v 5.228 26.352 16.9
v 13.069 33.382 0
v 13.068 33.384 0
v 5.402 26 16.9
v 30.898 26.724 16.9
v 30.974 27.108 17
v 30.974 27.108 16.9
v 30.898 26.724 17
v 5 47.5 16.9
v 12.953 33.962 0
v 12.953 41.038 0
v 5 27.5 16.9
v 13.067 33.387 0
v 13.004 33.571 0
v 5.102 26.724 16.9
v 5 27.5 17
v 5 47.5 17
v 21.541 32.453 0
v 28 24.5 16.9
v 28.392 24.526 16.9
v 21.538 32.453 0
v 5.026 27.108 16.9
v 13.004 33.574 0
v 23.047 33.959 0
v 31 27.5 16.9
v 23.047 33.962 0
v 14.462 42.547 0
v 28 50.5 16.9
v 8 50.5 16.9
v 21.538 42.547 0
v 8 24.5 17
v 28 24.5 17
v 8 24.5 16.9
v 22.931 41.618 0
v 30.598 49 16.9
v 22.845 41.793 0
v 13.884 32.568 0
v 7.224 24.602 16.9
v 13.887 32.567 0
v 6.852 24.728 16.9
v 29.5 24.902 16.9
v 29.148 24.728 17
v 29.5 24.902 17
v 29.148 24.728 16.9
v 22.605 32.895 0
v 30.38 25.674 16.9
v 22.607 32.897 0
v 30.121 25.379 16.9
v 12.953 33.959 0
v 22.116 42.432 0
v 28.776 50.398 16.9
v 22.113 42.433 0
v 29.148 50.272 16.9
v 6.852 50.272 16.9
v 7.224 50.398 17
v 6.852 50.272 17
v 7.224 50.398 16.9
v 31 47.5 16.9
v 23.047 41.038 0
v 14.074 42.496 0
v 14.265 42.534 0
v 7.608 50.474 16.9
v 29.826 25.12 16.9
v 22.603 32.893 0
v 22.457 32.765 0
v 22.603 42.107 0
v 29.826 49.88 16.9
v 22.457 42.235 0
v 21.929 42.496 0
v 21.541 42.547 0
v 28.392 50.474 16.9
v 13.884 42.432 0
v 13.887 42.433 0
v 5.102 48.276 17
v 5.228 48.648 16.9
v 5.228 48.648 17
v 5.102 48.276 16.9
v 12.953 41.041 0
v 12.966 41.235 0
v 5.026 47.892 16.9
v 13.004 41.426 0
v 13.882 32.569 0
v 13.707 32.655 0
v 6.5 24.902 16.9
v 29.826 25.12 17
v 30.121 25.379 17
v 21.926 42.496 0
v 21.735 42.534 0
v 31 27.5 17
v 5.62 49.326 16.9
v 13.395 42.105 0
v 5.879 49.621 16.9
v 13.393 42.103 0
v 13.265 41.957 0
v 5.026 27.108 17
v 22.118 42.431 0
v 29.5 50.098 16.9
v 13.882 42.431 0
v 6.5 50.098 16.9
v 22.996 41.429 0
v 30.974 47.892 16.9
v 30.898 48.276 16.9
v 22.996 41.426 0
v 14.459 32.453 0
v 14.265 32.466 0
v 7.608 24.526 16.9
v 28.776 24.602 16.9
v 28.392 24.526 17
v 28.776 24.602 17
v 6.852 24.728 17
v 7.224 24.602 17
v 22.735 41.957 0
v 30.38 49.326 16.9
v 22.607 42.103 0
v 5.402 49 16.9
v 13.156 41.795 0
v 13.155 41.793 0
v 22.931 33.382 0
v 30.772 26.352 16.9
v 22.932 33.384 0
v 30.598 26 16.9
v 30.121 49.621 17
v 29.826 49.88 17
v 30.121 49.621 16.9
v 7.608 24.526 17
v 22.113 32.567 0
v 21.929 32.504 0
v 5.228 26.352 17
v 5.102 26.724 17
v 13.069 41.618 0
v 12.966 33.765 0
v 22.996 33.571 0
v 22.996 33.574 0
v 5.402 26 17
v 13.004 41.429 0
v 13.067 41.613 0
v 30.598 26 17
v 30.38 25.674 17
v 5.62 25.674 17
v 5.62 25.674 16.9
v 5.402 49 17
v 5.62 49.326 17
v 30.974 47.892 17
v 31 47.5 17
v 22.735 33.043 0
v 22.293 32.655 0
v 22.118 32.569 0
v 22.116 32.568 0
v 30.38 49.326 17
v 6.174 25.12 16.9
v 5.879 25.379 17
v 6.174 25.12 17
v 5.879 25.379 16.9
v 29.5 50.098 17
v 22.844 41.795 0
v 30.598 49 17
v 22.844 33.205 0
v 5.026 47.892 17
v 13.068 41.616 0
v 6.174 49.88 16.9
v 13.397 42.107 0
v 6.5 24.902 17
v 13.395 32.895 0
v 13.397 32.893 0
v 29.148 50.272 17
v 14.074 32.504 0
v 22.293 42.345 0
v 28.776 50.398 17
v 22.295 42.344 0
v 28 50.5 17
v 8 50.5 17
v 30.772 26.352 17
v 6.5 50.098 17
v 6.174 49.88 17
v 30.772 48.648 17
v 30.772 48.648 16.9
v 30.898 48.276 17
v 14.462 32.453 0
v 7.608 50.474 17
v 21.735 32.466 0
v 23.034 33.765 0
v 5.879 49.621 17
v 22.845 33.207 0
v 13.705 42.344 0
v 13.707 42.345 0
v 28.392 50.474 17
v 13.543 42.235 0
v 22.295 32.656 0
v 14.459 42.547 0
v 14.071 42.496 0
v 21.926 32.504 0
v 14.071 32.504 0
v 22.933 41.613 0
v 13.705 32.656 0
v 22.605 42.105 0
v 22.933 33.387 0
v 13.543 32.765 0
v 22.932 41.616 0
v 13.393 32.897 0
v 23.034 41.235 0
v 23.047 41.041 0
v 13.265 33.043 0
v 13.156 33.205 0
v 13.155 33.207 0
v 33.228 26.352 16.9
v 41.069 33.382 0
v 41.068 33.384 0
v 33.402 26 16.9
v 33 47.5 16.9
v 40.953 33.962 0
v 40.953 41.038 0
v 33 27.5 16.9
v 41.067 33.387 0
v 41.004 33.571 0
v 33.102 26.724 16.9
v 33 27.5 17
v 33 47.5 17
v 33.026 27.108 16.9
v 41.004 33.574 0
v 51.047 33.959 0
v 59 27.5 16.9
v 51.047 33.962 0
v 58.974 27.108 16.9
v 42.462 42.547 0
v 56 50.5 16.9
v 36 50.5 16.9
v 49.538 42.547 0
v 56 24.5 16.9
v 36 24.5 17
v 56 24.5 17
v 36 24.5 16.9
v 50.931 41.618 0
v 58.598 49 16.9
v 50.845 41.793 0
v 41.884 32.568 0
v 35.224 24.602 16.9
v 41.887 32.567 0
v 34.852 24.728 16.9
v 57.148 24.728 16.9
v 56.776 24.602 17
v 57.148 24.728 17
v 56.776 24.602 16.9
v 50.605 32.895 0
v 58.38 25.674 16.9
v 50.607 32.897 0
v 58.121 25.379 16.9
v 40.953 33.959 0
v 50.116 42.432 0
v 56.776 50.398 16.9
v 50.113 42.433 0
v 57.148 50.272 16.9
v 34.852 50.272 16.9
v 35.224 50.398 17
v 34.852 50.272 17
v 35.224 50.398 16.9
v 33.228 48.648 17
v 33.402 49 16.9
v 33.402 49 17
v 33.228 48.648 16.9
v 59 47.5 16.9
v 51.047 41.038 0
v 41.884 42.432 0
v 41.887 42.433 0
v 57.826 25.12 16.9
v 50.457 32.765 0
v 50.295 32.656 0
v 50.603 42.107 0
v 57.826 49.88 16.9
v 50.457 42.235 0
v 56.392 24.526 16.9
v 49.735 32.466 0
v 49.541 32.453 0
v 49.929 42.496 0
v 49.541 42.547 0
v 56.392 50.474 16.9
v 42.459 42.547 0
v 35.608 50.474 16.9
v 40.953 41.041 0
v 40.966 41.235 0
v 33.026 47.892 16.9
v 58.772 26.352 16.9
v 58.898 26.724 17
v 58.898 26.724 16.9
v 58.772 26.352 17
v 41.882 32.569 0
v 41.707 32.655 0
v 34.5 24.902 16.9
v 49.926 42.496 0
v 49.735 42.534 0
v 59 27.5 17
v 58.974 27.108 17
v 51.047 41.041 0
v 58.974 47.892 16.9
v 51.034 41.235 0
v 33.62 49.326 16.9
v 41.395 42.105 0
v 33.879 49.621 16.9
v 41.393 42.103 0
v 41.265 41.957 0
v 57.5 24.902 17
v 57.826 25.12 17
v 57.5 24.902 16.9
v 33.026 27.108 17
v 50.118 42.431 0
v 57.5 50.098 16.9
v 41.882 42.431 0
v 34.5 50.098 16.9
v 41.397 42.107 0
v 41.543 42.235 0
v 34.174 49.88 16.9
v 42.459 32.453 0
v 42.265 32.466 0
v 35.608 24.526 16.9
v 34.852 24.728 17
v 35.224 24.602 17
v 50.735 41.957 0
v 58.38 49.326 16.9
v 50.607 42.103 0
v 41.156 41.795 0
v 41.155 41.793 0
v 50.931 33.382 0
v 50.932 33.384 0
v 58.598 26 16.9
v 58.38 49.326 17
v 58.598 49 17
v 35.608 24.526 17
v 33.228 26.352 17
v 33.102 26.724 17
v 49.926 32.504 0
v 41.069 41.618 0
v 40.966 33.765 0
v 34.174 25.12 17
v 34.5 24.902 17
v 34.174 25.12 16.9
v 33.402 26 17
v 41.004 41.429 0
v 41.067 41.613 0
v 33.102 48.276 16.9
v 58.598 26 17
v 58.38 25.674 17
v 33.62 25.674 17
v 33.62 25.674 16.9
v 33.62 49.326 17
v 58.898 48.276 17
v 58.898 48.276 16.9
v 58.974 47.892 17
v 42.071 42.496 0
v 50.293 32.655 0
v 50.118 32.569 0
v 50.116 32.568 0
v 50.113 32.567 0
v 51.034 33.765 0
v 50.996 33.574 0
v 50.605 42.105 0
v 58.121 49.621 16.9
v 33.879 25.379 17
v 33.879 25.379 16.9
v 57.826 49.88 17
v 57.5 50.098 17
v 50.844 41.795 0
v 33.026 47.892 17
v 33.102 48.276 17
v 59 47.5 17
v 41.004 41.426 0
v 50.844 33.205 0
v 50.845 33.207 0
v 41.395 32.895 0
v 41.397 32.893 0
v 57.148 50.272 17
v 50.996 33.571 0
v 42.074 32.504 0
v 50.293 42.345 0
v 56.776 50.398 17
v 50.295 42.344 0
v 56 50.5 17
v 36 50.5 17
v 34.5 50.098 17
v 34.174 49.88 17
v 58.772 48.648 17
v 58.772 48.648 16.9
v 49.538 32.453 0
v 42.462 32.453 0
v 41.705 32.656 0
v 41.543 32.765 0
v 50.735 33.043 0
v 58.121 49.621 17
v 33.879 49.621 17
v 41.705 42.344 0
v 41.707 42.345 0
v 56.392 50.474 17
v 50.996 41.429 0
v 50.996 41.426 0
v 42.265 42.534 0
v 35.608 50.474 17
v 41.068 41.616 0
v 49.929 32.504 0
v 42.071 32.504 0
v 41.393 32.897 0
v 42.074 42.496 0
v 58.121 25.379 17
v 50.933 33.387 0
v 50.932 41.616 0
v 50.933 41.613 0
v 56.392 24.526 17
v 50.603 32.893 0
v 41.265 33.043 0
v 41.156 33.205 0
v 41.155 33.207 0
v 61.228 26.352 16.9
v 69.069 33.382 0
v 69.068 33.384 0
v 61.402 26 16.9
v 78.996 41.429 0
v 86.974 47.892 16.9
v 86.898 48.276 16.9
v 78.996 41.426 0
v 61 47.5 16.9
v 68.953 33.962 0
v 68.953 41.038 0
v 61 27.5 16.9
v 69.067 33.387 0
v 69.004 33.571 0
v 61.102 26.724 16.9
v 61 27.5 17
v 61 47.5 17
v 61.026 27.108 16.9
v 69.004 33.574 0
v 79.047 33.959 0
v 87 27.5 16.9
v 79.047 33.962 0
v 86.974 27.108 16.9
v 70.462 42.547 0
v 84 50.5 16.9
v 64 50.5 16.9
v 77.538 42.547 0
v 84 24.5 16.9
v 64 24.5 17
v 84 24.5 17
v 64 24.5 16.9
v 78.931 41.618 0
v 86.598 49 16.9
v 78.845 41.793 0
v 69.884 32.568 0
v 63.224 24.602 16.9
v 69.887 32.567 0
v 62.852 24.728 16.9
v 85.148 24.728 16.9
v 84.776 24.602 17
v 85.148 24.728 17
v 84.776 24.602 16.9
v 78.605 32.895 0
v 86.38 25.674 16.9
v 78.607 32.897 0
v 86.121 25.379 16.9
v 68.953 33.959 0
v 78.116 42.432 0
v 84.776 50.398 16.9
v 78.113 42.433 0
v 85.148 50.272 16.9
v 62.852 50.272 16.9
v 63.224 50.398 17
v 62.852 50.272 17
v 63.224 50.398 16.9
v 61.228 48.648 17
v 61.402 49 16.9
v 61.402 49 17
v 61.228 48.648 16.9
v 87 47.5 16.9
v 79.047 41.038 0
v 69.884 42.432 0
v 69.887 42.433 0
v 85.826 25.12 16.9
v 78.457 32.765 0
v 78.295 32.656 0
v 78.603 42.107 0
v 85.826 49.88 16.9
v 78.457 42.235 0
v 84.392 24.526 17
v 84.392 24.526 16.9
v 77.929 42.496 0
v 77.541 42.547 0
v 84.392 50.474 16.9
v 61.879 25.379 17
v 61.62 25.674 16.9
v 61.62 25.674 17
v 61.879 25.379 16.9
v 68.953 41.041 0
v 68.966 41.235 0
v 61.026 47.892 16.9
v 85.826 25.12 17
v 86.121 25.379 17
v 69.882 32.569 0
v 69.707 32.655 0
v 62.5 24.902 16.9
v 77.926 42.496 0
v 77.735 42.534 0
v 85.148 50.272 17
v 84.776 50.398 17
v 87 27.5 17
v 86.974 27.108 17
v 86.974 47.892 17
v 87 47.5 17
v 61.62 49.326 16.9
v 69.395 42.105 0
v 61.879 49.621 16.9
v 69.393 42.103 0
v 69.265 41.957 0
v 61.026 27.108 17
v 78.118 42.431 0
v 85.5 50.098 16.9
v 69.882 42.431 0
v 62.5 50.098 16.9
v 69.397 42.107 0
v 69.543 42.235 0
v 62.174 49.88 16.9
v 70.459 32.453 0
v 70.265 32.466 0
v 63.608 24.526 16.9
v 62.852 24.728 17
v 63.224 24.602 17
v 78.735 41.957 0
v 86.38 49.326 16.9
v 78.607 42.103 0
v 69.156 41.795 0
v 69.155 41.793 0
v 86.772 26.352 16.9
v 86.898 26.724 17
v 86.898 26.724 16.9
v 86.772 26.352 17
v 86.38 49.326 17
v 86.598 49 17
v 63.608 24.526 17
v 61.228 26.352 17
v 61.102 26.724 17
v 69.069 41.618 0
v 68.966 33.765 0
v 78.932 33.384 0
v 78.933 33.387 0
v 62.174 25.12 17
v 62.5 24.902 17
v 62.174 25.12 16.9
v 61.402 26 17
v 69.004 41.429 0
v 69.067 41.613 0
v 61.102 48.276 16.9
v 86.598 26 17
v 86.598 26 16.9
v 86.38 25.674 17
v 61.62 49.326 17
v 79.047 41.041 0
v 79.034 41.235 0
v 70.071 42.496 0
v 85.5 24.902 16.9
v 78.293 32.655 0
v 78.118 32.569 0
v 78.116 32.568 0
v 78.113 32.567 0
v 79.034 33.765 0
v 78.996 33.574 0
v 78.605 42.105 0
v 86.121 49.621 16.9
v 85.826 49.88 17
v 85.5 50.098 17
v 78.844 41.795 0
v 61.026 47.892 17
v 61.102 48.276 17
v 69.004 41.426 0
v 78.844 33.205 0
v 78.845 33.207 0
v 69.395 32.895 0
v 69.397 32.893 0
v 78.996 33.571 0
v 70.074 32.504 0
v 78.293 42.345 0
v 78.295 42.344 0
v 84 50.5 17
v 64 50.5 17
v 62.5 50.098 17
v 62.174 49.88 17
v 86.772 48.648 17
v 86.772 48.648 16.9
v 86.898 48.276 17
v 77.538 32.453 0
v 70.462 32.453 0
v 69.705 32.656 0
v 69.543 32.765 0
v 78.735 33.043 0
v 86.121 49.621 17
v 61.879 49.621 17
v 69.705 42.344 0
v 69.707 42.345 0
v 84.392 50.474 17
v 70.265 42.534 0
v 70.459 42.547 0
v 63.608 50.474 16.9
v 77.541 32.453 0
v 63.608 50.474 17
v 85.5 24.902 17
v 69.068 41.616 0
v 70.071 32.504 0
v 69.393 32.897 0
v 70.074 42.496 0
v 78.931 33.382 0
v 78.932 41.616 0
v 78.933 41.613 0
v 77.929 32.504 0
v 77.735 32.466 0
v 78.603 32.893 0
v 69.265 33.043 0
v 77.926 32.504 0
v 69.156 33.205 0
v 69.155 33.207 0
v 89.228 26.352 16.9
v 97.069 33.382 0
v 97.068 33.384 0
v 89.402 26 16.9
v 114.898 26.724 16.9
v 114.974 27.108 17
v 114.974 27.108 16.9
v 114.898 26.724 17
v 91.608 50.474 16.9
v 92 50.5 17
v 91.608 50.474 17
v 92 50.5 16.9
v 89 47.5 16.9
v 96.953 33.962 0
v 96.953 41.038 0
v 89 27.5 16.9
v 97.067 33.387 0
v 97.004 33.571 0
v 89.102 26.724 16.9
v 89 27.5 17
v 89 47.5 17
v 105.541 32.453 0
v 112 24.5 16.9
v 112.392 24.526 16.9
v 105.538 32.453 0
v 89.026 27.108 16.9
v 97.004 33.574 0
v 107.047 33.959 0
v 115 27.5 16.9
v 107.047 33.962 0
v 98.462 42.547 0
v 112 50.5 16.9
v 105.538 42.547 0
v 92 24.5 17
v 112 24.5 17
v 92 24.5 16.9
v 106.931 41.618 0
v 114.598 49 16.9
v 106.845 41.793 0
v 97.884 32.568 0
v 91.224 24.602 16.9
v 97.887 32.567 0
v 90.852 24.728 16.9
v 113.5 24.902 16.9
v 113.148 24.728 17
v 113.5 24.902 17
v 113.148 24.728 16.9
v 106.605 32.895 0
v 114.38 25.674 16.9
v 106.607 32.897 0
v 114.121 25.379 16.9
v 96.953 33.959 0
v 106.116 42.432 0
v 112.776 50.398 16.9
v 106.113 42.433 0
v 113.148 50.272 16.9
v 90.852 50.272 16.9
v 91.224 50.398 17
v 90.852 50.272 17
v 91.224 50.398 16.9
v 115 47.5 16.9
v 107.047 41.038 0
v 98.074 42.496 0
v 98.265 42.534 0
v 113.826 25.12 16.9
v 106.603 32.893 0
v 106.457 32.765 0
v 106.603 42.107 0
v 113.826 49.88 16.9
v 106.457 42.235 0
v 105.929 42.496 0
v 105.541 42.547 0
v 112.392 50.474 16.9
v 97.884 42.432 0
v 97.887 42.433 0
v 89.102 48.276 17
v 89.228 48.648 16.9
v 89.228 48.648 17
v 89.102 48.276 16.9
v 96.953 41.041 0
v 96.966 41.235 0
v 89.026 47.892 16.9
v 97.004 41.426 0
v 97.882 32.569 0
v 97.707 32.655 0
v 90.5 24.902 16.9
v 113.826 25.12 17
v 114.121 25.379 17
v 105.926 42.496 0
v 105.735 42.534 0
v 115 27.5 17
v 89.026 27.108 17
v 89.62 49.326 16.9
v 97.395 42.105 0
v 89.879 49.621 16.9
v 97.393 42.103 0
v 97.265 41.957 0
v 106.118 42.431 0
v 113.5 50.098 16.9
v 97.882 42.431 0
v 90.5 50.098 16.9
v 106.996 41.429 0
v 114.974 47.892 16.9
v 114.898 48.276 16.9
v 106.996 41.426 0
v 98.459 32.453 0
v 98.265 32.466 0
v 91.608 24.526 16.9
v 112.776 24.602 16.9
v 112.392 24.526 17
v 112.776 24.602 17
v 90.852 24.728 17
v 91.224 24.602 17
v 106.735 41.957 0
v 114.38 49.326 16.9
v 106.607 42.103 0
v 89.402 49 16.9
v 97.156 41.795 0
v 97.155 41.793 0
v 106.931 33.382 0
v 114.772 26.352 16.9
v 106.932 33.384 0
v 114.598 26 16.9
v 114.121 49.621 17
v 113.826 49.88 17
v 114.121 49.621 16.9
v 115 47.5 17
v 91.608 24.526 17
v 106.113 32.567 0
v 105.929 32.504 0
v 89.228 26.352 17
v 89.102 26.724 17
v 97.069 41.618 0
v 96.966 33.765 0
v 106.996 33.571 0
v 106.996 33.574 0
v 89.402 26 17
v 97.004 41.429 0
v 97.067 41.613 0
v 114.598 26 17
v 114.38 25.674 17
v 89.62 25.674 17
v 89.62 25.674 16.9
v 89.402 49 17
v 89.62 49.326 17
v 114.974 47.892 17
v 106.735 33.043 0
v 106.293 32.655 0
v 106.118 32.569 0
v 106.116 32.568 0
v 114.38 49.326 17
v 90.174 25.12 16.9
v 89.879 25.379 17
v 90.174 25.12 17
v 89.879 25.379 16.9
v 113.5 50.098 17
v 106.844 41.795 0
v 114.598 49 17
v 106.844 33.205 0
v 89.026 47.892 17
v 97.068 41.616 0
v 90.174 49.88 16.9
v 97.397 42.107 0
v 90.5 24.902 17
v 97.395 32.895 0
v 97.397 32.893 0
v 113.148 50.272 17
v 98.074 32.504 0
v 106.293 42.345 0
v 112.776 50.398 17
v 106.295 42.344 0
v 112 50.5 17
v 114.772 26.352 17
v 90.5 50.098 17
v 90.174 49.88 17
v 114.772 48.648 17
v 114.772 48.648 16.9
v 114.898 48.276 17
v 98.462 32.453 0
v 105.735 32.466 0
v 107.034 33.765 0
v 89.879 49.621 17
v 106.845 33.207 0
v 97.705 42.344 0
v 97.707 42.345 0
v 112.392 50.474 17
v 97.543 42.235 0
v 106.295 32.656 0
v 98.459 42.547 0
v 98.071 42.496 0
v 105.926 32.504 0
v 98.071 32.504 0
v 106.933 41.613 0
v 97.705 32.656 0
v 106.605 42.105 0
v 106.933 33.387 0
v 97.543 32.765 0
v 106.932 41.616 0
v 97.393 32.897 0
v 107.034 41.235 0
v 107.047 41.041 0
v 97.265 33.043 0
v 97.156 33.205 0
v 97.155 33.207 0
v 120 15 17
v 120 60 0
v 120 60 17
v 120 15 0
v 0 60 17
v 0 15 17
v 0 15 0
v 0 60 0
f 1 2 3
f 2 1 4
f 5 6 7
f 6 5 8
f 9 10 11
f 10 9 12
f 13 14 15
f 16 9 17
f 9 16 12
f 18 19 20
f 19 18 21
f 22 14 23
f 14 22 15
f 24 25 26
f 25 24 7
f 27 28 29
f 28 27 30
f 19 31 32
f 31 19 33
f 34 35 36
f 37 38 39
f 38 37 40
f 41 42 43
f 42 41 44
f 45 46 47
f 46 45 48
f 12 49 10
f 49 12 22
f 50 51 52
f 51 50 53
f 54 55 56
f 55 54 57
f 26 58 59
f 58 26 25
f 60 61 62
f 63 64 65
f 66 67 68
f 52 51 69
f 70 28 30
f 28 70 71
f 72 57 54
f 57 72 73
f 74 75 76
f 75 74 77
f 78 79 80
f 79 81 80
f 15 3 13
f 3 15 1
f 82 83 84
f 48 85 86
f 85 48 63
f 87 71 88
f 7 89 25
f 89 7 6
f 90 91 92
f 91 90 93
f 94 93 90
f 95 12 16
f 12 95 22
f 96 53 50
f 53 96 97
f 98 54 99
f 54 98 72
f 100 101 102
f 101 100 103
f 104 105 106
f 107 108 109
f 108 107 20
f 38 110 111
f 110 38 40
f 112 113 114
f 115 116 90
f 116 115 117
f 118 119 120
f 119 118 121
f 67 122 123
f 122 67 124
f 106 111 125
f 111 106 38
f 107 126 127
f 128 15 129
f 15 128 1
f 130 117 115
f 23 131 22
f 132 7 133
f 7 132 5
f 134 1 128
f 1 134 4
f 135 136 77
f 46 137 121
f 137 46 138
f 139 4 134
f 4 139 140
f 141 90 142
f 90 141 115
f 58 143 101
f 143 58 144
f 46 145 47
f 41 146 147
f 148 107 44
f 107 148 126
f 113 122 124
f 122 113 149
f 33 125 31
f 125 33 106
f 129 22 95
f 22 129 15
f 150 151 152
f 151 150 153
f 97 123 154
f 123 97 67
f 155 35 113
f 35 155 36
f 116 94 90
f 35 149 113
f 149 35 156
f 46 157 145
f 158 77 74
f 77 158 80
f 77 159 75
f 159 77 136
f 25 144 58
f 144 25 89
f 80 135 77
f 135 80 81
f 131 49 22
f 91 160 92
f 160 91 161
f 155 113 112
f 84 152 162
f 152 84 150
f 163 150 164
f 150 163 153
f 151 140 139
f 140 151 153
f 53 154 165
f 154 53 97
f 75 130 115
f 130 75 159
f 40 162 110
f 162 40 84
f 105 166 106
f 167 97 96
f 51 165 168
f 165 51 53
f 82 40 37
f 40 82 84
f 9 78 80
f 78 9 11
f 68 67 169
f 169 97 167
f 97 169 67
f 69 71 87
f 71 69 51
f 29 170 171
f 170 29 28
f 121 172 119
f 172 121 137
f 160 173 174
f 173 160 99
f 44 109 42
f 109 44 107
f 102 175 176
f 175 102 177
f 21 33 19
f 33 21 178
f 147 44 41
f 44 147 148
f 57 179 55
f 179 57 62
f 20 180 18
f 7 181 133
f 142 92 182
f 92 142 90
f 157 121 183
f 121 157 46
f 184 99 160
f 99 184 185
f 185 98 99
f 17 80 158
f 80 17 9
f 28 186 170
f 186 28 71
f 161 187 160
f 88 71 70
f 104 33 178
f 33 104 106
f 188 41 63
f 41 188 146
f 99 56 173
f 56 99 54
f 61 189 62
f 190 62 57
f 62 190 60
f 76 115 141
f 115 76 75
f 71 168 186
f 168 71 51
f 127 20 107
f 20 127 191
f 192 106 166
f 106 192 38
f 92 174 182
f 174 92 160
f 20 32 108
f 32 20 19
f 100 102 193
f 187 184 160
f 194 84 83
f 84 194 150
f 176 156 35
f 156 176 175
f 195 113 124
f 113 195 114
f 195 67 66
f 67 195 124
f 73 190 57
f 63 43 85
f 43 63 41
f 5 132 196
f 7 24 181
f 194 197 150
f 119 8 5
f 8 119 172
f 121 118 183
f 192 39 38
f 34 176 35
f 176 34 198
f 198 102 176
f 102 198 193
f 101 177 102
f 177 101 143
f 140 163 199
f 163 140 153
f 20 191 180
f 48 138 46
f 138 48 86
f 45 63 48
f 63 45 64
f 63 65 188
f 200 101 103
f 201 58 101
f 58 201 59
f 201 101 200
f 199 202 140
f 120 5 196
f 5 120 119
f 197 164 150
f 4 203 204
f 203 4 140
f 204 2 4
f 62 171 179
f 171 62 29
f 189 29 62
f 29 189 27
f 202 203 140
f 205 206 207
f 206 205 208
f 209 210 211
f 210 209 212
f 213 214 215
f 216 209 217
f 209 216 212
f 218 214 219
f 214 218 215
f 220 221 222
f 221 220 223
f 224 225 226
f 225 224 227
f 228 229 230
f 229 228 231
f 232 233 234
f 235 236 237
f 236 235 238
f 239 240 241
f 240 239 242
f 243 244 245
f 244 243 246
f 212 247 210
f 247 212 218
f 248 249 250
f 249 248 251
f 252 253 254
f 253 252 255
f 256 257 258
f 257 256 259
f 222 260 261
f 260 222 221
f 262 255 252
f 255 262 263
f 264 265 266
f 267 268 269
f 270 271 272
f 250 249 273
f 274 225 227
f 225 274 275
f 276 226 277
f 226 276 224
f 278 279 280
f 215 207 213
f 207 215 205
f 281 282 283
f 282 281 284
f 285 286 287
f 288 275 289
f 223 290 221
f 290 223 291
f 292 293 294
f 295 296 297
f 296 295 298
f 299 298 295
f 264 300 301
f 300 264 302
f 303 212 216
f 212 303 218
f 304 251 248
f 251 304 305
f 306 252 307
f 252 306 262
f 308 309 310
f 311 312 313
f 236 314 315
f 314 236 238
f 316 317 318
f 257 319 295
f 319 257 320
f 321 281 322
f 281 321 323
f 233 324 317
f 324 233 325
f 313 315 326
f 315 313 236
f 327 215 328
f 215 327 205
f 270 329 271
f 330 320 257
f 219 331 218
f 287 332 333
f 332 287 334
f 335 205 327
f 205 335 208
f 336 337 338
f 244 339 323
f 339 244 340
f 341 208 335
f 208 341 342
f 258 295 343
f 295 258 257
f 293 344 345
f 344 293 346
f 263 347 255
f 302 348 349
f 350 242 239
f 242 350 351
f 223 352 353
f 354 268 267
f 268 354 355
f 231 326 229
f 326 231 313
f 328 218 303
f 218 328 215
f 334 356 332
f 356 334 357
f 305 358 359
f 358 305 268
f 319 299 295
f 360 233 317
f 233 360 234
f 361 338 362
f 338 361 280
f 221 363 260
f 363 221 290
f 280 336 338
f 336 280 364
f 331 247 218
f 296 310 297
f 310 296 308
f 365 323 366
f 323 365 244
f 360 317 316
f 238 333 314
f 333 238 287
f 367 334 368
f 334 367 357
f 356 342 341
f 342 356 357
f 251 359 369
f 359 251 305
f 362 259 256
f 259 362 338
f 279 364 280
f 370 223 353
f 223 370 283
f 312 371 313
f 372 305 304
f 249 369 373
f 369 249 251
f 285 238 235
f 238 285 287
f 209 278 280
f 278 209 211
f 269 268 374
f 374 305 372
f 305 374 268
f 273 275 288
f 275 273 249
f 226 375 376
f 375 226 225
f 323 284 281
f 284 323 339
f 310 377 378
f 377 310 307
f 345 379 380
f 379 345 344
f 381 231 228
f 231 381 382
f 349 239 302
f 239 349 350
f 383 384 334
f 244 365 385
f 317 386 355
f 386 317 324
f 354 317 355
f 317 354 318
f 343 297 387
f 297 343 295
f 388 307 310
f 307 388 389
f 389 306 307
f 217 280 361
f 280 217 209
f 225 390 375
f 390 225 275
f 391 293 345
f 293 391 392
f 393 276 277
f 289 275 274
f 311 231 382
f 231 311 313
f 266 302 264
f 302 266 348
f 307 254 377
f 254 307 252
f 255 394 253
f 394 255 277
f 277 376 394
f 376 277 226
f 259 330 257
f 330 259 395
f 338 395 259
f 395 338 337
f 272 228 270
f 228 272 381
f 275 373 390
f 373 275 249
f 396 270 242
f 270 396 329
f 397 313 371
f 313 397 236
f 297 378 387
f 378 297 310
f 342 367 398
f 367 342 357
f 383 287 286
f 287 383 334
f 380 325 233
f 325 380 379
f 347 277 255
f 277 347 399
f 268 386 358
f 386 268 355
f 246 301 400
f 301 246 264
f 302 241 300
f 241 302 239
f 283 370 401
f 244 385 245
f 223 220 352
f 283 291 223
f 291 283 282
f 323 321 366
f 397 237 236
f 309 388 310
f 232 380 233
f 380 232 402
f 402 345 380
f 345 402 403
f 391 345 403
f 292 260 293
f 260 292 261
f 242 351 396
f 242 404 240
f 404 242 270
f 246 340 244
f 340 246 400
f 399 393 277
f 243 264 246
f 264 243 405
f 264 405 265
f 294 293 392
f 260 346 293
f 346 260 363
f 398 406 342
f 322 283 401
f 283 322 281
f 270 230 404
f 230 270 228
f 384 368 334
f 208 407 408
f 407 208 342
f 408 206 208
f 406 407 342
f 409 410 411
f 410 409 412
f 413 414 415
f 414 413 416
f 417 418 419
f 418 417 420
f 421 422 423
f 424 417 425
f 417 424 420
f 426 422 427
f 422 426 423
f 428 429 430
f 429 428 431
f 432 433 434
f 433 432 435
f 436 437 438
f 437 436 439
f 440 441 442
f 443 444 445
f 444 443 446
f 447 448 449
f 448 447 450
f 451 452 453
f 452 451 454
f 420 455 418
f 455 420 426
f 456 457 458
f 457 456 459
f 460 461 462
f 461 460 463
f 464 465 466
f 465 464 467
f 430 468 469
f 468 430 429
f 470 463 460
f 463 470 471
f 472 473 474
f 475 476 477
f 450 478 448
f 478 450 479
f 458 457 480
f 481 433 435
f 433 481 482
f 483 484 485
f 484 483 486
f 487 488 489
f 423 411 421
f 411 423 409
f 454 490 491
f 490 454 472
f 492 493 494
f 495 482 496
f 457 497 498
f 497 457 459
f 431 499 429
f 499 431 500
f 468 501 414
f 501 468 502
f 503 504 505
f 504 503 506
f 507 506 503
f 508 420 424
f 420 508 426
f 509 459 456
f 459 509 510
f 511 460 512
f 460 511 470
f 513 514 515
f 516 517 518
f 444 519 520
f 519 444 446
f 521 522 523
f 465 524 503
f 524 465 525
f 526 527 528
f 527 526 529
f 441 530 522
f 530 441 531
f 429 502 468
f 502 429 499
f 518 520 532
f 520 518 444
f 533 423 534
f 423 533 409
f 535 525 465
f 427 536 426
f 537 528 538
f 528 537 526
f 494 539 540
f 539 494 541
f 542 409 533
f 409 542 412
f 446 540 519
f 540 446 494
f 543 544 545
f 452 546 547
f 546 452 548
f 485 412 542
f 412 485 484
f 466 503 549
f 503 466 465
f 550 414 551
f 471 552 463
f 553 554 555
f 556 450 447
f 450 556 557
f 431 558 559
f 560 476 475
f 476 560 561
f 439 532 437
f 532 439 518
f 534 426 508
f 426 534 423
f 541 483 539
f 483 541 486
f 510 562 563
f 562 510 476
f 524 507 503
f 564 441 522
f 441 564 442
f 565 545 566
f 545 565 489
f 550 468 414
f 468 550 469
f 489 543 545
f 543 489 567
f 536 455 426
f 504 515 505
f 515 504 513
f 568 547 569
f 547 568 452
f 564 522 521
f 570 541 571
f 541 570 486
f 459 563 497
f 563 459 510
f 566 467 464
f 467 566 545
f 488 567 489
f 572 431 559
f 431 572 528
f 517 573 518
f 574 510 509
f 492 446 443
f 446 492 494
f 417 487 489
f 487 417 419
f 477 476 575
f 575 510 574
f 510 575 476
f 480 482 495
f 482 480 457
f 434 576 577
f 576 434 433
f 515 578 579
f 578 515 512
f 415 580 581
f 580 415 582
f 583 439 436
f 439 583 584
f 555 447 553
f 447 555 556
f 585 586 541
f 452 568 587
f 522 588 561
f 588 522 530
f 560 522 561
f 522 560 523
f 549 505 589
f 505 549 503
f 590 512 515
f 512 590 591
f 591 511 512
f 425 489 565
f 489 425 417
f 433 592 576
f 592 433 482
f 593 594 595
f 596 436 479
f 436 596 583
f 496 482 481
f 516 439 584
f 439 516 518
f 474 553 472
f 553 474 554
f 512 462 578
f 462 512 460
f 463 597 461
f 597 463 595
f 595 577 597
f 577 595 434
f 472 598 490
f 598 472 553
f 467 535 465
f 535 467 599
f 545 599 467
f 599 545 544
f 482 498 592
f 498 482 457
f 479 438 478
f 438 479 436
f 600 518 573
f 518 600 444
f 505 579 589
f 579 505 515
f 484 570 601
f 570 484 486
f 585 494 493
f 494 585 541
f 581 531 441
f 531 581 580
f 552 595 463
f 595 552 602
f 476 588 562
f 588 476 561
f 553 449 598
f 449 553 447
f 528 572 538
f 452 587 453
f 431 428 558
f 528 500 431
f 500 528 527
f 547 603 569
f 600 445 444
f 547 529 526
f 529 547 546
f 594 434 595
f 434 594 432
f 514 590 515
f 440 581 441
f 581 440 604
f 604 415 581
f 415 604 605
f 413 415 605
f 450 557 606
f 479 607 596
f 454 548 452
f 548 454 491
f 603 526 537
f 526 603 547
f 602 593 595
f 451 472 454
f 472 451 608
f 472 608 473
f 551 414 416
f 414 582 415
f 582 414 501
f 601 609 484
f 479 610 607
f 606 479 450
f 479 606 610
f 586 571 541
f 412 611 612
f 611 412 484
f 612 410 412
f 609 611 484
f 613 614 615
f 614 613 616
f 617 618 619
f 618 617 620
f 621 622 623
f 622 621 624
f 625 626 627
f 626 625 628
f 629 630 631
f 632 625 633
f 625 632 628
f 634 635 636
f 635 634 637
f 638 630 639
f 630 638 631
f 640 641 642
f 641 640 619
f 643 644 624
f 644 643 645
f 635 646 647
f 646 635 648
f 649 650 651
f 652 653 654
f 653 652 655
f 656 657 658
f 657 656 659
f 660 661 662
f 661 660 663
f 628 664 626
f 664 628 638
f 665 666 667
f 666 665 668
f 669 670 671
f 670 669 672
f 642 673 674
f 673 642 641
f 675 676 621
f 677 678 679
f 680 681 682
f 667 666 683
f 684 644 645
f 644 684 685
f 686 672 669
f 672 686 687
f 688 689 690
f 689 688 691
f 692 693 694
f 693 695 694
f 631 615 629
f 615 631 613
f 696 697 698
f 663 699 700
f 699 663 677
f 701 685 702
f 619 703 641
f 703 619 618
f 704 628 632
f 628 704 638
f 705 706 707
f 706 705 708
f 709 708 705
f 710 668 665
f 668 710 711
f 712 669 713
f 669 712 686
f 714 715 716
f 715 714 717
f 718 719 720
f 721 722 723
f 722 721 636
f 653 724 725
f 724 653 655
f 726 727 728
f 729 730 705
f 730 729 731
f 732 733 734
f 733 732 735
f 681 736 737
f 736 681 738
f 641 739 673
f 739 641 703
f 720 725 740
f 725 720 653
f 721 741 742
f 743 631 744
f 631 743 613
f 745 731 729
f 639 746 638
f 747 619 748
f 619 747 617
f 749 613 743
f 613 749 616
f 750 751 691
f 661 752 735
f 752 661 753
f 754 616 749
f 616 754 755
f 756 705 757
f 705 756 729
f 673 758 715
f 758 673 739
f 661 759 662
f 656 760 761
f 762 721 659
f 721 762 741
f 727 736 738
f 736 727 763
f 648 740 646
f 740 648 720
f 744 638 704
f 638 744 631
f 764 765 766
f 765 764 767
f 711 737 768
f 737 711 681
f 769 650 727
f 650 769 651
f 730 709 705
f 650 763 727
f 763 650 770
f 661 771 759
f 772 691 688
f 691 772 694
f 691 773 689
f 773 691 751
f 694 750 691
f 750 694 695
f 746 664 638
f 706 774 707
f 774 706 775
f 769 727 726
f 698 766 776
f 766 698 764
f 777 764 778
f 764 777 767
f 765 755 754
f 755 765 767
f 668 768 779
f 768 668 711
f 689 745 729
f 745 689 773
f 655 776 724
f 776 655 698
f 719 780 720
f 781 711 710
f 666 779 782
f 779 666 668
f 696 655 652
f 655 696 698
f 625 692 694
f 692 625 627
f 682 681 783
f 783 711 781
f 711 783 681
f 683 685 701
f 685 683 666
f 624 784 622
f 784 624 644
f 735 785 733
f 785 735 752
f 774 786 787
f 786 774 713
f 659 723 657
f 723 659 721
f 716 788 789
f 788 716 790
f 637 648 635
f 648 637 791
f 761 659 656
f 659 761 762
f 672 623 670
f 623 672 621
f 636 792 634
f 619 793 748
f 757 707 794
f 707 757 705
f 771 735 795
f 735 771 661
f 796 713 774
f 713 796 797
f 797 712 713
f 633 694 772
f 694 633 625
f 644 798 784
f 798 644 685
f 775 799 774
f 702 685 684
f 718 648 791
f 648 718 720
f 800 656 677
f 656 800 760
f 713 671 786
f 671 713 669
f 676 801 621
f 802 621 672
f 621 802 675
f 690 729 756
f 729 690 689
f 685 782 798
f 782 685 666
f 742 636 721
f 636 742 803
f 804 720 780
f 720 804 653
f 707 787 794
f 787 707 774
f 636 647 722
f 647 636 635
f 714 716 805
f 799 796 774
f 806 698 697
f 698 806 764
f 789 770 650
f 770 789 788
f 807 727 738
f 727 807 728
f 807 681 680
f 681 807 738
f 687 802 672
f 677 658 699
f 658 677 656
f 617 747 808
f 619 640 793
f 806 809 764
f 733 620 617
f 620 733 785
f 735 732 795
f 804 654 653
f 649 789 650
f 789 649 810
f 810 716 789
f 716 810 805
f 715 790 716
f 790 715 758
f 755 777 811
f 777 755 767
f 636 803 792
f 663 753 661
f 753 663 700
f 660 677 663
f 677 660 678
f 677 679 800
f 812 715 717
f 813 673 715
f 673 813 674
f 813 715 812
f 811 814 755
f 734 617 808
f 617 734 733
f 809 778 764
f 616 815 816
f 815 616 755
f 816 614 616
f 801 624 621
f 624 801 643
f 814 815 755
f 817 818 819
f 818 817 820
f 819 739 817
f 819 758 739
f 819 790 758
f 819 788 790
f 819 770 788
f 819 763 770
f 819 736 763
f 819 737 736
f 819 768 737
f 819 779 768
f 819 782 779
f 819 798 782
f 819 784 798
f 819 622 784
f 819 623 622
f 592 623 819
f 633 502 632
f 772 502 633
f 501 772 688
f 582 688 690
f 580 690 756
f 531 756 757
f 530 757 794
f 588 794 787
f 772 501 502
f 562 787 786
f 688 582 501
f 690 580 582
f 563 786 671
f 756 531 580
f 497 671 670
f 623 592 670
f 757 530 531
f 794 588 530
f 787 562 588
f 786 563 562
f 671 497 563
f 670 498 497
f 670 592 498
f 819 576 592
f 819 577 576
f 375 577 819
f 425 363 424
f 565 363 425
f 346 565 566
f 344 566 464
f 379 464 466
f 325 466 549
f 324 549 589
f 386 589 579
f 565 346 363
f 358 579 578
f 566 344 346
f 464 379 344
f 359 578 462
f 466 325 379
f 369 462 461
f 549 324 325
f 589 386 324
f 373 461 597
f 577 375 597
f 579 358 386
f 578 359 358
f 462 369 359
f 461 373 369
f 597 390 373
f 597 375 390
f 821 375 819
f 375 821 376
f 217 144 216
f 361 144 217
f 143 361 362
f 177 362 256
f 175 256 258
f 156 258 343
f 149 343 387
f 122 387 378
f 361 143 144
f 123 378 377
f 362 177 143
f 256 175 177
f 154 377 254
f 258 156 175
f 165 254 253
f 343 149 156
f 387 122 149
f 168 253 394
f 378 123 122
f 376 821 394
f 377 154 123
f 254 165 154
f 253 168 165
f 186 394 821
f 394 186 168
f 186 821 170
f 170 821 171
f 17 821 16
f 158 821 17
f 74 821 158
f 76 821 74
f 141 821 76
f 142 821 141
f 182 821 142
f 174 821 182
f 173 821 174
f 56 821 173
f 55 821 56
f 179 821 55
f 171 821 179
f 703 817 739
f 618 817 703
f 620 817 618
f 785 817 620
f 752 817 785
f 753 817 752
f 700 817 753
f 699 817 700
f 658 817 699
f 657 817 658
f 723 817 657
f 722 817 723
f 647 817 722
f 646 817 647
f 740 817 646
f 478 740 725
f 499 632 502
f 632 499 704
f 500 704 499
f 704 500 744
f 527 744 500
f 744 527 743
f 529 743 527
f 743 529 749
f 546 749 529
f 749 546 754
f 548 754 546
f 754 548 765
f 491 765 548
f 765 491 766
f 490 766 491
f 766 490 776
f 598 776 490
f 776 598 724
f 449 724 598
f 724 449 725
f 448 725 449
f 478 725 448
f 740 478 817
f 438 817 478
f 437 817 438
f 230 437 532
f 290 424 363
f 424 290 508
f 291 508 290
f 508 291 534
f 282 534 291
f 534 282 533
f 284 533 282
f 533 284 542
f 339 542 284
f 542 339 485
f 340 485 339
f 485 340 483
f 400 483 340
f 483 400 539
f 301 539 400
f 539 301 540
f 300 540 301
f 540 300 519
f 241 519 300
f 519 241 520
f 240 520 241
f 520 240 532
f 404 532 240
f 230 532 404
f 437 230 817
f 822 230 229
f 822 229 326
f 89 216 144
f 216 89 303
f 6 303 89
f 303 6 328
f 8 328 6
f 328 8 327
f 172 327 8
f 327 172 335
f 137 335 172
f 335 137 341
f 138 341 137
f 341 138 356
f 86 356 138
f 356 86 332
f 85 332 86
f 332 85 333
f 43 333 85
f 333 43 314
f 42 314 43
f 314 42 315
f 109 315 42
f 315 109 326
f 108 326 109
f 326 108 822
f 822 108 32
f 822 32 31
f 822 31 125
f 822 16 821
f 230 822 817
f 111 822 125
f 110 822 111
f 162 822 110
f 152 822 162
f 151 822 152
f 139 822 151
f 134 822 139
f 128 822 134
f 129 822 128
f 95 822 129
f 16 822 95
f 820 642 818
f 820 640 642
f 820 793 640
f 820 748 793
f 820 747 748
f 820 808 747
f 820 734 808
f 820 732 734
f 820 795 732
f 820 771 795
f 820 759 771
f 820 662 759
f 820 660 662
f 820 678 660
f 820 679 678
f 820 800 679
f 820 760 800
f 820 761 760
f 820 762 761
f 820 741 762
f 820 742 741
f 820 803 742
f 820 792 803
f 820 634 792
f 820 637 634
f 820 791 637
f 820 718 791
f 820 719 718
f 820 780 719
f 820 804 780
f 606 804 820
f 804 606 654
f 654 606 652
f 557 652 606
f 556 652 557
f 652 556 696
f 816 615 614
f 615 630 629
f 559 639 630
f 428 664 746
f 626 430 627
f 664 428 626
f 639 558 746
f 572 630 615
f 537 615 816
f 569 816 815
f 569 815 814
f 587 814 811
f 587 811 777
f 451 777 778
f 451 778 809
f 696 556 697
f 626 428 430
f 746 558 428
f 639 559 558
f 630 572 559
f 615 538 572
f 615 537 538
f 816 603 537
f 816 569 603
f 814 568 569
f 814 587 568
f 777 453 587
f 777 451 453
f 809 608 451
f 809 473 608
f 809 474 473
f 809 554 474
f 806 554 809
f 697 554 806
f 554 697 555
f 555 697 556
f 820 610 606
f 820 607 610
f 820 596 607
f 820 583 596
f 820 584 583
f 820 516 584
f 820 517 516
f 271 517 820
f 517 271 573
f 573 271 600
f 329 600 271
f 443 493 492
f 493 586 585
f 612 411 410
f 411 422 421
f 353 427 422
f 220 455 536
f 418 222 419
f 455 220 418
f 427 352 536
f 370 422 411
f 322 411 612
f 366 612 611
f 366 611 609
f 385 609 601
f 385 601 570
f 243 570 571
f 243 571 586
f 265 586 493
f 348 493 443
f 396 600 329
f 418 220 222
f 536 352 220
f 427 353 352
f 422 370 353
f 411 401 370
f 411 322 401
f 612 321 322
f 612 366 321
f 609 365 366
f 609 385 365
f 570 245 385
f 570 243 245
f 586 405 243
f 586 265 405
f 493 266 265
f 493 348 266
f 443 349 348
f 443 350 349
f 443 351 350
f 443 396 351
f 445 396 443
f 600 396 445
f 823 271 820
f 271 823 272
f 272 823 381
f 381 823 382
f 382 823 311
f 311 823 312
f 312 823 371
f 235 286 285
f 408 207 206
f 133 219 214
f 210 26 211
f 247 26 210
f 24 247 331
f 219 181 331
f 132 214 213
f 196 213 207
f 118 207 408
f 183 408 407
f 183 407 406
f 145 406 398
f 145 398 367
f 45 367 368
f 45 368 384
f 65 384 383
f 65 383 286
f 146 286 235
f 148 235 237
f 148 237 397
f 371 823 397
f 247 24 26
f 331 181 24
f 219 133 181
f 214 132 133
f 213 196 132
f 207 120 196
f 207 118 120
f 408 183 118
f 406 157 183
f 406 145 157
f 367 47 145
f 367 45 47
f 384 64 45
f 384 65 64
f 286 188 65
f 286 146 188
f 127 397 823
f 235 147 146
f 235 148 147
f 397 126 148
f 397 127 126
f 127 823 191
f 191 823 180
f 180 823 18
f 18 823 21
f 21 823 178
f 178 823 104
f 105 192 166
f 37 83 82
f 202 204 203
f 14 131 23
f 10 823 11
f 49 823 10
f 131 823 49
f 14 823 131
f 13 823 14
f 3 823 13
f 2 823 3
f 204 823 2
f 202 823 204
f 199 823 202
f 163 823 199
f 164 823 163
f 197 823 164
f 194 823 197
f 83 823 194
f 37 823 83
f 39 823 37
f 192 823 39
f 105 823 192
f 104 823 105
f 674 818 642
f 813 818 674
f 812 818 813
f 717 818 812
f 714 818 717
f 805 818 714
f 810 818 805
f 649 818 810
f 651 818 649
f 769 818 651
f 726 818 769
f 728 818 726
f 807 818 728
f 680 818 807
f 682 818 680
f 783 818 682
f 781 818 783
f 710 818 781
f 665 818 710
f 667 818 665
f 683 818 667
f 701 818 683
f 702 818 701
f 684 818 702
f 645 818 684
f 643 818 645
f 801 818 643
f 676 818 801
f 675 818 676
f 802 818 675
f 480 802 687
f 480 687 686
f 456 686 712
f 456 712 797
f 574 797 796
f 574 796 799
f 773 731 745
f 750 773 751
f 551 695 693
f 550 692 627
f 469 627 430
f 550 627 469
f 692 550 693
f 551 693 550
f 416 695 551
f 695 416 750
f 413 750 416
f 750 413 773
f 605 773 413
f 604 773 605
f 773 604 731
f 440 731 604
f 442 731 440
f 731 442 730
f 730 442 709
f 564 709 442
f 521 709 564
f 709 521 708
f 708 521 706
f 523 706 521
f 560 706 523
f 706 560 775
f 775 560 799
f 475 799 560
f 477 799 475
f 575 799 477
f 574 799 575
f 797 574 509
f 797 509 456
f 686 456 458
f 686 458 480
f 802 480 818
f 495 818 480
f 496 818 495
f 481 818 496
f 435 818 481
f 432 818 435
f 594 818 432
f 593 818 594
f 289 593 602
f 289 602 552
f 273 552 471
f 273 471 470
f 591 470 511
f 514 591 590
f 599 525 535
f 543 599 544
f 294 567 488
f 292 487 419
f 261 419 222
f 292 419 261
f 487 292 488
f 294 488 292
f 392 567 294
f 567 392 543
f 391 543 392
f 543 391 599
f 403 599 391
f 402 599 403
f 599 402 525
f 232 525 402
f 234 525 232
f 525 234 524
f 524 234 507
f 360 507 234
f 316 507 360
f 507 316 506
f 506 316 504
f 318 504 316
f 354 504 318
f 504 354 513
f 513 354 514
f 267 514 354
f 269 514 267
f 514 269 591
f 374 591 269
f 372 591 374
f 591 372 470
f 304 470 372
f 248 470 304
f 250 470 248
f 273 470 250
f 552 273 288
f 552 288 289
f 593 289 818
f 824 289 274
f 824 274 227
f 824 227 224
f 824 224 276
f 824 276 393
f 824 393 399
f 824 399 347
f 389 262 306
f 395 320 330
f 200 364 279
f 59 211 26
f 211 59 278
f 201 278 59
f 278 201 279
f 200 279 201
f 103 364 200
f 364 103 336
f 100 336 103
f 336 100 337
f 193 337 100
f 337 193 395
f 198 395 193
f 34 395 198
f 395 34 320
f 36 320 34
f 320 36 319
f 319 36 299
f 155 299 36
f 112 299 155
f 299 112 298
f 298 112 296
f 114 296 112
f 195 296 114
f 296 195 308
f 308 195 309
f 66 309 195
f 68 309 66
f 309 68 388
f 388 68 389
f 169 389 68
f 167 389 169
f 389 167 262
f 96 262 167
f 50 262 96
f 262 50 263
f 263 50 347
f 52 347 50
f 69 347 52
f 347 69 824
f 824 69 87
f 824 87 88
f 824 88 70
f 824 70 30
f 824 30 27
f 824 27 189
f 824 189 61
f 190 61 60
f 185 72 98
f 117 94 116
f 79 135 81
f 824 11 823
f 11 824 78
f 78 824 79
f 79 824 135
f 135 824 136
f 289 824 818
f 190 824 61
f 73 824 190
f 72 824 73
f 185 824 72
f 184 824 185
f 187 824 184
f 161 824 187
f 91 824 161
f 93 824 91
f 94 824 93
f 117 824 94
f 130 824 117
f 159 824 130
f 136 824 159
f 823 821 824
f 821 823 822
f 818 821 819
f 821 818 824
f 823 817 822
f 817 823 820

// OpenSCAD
// Smart Pill Box Restart
// Clean rebuild starting from pill_tray only
// OpenSCAD units: mm

part = "pill_tray";

$fn = 48;

// ------------------------------------------------------------
// Main dimensions
// ------------------------------------------------------------
case_w = 120;
case_d = 60;

wall = 2;

upper_inset = 15;
upper_len = 45;
tray_h = 17;

pill_open = 26;
pill_bottom_open = 10;
pill_gap = 2;

top_hole = 15;
top_hole_y = upper_inset + (upper_len - top_hole) / 2;
pill_center_y = top_hole_y + top_hole / 2;

pill_group_w = pill_open * 4 + pill_gap * 3;
pill_start_x = (case_w - pill_group_w) / 2;
pill_centers_x = [
    for (i = [0:3])
        pill_start_x + pill_open / 2 + i * (pill_open + pill_gap)
];

// ------------------------------------------------------------
// Helpers
// ------------------------------------------------------------
module box(size) {
    cube(size);
}

module rounded_square_2d(size, r) {
    hull() {
        for (x = [-size / 2 + r, size / 2 - r])
            for (y = [-size / 2 + r, size / 2 - r])
                translate([x, y])
                    circle(r = r);
    }
}

module funnel_hole(cx, cy, top_size, bottom_size) {
    translate([cx, cy, 0])
        hull() {
            translate([0, 0, tray_h - 0.1])
                linear_extrude(height = 0.2)
                    rounded_square_2d(top_size, 3);

            translate([0, 0, -0.1])
                linear_extrude(height = 0.2)
                    rounded_square_2d(bottom_size, 1.5);
        }
}

// ------------------------------------------------------------
// Pill tray
// ------------------------------------------------------------
module pill_tray() {
    difference() {
        translate([0, upper_inset, 0])
            box([case_w, upper_len, tray_h]);

        for (cx = pill_centers_x)
            funnel_hole(cx, pill_center_y, pill_open, pill_bottom_open);
    }
}

// ------------------------------------------------------------
// Output
// ------------------------------------------------------------
if (part == "pill_tray") {
    color("#d9d9d9") pill_tray();
} else {
    color("#d9d9d9") pill_tray();
}
